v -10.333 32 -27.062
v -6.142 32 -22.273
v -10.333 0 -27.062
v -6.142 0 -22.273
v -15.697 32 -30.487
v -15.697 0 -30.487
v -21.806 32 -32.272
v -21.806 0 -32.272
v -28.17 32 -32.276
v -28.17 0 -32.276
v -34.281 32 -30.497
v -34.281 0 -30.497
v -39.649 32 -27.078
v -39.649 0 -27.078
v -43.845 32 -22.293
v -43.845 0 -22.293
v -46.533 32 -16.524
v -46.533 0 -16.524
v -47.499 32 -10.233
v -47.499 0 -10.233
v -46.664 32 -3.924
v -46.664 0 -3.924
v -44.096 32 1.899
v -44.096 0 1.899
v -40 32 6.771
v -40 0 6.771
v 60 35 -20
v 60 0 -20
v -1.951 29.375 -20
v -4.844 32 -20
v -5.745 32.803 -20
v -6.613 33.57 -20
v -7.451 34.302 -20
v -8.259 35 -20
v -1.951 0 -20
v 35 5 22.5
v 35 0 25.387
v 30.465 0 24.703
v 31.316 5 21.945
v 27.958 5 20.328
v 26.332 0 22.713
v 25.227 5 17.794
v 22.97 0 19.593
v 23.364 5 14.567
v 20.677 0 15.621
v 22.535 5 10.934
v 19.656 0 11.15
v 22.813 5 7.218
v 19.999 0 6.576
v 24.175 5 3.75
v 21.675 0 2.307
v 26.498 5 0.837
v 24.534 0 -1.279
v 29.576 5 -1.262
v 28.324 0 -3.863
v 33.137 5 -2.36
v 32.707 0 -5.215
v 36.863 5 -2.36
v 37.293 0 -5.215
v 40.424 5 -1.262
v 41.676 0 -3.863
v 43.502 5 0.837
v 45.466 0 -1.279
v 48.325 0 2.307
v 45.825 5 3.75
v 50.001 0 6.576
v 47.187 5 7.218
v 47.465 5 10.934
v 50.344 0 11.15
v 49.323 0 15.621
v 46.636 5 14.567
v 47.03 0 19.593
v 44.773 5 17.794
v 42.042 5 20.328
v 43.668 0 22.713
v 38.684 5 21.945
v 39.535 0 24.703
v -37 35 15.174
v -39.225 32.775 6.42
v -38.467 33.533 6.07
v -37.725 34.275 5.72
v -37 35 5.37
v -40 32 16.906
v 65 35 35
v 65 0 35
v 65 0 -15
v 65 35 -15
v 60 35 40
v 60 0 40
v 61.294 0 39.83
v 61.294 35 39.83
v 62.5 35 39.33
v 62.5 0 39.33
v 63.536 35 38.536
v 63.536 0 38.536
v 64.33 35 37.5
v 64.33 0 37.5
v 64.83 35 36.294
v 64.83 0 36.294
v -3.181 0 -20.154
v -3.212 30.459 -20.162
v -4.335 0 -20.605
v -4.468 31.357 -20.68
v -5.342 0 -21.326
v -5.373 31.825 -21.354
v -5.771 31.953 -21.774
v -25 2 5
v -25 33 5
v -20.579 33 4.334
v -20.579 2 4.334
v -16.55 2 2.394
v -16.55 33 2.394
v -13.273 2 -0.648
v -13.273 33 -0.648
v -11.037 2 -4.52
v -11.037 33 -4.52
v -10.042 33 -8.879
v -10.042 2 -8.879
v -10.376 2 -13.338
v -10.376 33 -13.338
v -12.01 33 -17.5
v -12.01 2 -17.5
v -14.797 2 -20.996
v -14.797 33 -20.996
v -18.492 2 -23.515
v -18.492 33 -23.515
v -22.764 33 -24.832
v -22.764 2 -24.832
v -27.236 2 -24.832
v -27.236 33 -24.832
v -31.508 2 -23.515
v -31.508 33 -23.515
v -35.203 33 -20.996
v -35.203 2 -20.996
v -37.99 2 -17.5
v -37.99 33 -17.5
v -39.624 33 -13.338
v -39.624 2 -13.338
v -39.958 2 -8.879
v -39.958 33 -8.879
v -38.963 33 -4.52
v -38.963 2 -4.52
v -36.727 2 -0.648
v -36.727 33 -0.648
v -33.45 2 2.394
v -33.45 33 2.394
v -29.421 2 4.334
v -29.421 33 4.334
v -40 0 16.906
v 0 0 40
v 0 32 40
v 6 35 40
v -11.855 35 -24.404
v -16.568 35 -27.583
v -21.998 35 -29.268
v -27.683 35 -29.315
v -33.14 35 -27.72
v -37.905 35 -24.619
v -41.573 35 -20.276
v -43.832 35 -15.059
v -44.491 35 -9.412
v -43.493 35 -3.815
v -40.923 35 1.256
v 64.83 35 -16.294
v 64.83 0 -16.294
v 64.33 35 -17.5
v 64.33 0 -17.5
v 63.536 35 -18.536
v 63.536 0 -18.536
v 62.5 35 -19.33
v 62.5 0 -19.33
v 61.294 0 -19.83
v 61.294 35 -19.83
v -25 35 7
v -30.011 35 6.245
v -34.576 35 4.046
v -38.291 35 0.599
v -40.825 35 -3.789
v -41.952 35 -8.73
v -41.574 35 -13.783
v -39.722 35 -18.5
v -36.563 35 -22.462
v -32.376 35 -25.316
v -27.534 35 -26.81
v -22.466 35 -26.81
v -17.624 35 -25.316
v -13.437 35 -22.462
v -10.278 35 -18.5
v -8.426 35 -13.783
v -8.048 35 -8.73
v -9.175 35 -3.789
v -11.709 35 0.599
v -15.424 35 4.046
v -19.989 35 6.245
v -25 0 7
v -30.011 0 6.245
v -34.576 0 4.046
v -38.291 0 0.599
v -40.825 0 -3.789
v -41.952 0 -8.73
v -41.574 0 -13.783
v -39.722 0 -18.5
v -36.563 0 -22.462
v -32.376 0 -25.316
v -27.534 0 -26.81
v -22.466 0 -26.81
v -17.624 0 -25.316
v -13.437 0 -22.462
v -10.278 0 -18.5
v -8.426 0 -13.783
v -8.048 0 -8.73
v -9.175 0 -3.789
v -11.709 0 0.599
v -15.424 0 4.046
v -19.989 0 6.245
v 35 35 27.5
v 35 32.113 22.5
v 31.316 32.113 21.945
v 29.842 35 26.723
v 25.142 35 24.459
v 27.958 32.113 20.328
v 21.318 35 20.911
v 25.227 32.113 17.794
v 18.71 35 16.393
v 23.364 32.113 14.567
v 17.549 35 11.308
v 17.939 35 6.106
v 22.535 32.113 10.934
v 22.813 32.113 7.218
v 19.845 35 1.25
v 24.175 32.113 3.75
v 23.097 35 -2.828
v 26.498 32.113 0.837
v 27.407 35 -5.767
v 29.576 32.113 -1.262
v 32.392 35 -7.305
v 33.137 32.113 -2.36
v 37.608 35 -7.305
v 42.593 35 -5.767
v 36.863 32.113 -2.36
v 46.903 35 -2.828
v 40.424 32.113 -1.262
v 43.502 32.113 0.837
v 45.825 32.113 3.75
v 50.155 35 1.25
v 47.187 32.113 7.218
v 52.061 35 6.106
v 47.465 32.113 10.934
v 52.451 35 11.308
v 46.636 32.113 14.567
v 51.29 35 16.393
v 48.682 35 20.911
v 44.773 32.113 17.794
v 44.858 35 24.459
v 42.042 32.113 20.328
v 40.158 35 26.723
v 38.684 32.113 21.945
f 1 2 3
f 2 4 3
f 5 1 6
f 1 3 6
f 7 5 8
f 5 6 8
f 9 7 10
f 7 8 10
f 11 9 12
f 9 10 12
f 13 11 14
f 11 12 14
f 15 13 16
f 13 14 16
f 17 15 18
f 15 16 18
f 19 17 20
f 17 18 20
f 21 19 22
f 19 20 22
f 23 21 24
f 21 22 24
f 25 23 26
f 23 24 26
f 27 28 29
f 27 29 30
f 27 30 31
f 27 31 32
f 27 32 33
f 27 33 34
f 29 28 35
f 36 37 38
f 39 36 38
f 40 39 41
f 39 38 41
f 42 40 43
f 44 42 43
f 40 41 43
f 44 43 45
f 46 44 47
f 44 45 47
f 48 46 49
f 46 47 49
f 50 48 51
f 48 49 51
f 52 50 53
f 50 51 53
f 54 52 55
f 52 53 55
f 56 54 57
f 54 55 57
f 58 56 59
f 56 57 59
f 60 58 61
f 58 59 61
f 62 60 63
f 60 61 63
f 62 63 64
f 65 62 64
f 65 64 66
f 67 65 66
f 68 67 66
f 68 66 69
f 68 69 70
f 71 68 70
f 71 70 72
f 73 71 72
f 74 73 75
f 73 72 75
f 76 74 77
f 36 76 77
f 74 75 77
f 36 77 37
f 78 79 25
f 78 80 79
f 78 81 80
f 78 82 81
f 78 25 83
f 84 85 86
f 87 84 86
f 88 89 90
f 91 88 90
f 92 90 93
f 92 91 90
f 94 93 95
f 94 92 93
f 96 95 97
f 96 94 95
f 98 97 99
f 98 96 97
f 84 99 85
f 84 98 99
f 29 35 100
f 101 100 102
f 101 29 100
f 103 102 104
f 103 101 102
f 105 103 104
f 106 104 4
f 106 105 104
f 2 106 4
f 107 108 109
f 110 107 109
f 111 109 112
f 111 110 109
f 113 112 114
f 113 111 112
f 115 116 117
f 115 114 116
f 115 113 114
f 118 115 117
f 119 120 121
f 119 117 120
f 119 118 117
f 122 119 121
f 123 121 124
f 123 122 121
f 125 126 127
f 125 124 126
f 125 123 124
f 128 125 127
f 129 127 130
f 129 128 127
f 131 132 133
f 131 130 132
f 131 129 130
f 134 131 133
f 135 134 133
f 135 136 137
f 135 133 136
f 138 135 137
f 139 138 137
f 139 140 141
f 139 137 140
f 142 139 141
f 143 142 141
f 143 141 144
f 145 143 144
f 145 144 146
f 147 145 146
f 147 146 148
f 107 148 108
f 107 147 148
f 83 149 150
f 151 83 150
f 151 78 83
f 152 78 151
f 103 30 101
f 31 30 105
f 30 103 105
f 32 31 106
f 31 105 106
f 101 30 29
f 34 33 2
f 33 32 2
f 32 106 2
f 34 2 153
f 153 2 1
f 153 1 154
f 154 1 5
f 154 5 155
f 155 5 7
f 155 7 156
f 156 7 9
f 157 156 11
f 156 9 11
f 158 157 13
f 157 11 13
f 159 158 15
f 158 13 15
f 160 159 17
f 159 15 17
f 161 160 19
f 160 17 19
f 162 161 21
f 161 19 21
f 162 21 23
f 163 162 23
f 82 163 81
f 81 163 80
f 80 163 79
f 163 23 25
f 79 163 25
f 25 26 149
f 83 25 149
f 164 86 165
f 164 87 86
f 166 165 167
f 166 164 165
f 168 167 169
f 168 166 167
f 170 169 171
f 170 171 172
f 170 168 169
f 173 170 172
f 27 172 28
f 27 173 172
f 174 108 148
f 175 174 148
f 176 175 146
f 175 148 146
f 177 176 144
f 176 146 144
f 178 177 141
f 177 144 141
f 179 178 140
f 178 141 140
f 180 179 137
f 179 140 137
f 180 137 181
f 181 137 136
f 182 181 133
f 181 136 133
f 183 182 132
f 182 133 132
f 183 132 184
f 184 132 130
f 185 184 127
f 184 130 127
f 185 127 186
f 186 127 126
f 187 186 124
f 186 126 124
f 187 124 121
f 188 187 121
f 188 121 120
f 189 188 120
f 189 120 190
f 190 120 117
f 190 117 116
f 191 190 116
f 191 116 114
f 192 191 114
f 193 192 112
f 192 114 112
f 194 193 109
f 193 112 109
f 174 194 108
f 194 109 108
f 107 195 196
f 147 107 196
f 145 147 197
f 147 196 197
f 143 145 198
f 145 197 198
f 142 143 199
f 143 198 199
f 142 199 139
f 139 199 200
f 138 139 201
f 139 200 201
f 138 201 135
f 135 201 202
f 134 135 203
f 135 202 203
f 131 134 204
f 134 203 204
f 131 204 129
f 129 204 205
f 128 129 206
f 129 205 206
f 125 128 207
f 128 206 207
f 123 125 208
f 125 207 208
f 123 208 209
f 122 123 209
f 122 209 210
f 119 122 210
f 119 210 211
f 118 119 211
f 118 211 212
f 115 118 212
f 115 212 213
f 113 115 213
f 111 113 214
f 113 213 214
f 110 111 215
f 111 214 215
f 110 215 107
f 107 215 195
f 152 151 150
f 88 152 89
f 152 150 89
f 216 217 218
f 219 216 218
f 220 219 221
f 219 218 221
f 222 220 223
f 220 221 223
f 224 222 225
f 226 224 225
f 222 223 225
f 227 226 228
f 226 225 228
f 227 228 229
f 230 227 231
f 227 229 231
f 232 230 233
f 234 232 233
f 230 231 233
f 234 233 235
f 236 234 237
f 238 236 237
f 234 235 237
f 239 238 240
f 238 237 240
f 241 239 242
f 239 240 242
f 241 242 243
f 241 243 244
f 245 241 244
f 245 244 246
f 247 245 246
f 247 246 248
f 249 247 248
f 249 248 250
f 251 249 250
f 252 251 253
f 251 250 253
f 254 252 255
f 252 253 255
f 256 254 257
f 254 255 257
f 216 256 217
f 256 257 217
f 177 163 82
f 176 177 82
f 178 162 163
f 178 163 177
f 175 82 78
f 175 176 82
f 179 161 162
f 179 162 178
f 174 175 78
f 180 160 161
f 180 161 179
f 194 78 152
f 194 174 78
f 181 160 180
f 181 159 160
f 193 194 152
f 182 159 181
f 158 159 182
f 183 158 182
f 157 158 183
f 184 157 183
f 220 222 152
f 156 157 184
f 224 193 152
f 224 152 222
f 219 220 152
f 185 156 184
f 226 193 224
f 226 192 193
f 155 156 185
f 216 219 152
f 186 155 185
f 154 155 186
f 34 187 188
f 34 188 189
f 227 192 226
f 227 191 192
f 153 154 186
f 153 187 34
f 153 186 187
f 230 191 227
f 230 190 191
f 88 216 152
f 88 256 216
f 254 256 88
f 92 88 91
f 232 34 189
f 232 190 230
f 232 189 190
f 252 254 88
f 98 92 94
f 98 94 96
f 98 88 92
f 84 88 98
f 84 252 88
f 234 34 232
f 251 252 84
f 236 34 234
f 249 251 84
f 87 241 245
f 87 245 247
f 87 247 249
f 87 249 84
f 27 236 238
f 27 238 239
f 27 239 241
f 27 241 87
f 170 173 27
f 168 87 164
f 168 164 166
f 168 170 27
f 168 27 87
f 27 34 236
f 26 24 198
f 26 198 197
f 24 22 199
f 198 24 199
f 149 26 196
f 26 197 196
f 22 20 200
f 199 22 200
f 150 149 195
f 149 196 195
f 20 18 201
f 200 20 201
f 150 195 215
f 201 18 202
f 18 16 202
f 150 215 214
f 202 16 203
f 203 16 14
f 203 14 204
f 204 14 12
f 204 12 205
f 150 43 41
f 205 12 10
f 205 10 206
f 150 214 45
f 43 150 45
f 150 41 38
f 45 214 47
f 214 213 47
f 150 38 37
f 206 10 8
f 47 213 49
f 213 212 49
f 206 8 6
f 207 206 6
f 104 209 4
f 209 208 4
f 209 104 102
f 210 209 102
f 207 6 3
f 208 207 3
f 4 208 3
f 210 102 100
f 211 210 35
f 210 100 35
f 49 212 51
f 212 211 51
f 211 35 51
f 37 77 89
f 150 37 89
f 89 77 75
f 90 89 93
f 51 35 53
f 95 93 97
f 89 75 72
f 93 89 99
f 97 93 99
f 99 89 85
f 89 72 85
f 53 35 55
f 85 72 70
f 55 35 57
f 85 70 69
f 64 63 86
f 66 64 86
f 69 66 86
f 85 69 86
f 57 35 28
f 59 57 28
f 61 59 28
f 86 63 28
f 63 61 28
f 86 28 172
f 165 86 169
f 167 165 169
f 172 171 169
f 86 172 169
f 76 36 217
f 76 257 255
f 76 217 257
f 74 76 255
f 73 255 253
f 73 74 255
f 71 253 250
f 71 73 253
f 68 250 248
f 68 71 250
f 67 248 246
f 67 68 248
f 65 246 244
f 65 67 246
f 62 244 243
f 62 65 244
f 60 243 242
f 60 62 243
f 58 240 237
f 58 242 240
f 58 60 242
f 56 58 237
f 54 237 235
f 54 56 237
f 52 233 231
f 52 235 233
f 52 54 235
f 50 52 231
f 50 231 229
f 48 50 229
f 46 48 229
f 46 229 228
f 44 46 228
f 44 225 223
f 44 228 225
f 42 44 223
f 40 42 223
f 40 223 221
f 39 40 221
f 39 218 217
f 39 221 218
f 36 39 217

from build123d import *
from OCP.BRepFilletAPI import BRepFilletAPI_MakeChamfer

# Parameters (mm, degrees)
BOSS_EXTRUDE1_DEPTH     = 35
CUT_EXTRUDE3_DEPTH      = 84.964278119
CUT_EXTRUDE3_DEPTH_BACK = 84.964278119
SKETCH2_R               = 12.5
SKETCH2_R_2             = 15
CHAMFER1_SIZE           = 3
CHAMFER2_SIZE           = 2
CHAMFER3_SIZE           = 5
CHAMFER3_SIZE2          = 2.886751346
FILLET1_R               = 5


with BuildPart() as part:
    # Sketch1 → Boss-Extrude1 (new body)
    with BuildSketch(Plane(origin=(0, 0, 0), x_dir=(1, 0, 0), z_dir=(0, 1, 0))):
        with BuildLine():
            Line((-40, -16.905989232), (0, -40))
            Line((0, -40), (65, -40))
            Line((65, -40), (65, 20))
            Line((65, 20), (-4.844355629, 20))
            ThreePointArc((-4.844355629, 20), (-38.631222116, 27.900831925), (-40, -6.770509831))
            Line((-40, -6.770509831), (-40, -16.905989232))
        make_face()
    extrude(amount=BOSS_EXTRUDE1_DEPTH)

    # Sketch2 → Cut-Extrude3 (cut, two sides: drawn at the far end of the back side and taken through both)
    with BuildSketch(Plane(origin=(0, 0, 0), x_dir=(1, 0, 0), z_dir=(0, 1, 0)).offset(-CUT_EXTRUDE3_DEPTH_BACK)):
        with Locations(Location((35, -10, 0), (0, 0, 270))):
            Circle(SKETCH2_R)
        with Locations(Location((-25, 10, 0), (0, 0, 270))):
            Circle(SKETCH2_R_2)
    extrude(amount=CUT_EXTRUDE3_DEPTH + CUT_EXTRUDE3_DEPTH_BACK, mode=Mode.SUBTRACT)

    # Chamfer1
    chamfer1_edges = [part.edges().sort_by_distance(p)[0] for p in [
        (-20, 35, 28.452994616),
        (-40, 35, 11.838249532),
        (-38.631222116, 35, -27.900831925),
    ]]
    chamfer(chamfer1_edges, length=CHAMFER1_SIZE)

    # Chamfer2
    chamfer2_edges = [part.edges().sort_by_distance(p)[0] for p in [
        (-25, 0, -25),
        (-25, 35, -25),
    ]]
    chamfer(chamfer2_edges, length=CHAMFER2_SIZE)

    # Chamfer3: one chamfer whose edges measure the first distance from different faces: ONE call of the kernel's chamfer builder (chamfer() names one face for all edges)
    chamfer3_edges_1 = [part.edges().sort_by_distance(p)[0] for p in [
        (35, 0, -2.5),
    ]]
    chamfer3_side_1 = [part.faces().sort_by_distance(p)[0] for p in [
        (35, 17.5, -2.5),
    ]]
    chamfer3_edges_2 = [part.edges().sort_by_distance(p)[0] for p in [
        (35, 35, -2.5),
    ]]
    chamfer3_side_2 = [part.faces().sort_by_distance(p)[0] for p in [
        (20.131502665, 35, 9.160583392),
    ]]
    chamfer3 = BRepFilletAPI_MakeChamfer(part.part.solid().wrapped)
    for e in chamfer3_edges_1:
        chamfer3.Add(CHAMFER3_SIZE, CHAMFER3_SIZE2, e.wrapped, chamfer3_side_1[0].wrapped)  # the first distance lies on this face
    for e in chamfer3_edges_2:
        chamfer3.Add(CHAMFER3_SIZE, CHAMFER3_SIZE2, e.wrapped, chamfer3_side_2[0].wrapped)  # the first distance lies on this face
    add(Compound.cast(chamfer3.Shape()), mode=Mode.REPLACE)

    # Fillet1
    fillet1_edges = [part.edges().sort_by_distance(p)[0] for p in [
        (65, 17.5, 40),
        (65, 17.5, -20),
        (-4.844355629, 16, -20),
    ]]
    fillet(fillet1_edges, radius=FILLET1_R)


solid = part.part
